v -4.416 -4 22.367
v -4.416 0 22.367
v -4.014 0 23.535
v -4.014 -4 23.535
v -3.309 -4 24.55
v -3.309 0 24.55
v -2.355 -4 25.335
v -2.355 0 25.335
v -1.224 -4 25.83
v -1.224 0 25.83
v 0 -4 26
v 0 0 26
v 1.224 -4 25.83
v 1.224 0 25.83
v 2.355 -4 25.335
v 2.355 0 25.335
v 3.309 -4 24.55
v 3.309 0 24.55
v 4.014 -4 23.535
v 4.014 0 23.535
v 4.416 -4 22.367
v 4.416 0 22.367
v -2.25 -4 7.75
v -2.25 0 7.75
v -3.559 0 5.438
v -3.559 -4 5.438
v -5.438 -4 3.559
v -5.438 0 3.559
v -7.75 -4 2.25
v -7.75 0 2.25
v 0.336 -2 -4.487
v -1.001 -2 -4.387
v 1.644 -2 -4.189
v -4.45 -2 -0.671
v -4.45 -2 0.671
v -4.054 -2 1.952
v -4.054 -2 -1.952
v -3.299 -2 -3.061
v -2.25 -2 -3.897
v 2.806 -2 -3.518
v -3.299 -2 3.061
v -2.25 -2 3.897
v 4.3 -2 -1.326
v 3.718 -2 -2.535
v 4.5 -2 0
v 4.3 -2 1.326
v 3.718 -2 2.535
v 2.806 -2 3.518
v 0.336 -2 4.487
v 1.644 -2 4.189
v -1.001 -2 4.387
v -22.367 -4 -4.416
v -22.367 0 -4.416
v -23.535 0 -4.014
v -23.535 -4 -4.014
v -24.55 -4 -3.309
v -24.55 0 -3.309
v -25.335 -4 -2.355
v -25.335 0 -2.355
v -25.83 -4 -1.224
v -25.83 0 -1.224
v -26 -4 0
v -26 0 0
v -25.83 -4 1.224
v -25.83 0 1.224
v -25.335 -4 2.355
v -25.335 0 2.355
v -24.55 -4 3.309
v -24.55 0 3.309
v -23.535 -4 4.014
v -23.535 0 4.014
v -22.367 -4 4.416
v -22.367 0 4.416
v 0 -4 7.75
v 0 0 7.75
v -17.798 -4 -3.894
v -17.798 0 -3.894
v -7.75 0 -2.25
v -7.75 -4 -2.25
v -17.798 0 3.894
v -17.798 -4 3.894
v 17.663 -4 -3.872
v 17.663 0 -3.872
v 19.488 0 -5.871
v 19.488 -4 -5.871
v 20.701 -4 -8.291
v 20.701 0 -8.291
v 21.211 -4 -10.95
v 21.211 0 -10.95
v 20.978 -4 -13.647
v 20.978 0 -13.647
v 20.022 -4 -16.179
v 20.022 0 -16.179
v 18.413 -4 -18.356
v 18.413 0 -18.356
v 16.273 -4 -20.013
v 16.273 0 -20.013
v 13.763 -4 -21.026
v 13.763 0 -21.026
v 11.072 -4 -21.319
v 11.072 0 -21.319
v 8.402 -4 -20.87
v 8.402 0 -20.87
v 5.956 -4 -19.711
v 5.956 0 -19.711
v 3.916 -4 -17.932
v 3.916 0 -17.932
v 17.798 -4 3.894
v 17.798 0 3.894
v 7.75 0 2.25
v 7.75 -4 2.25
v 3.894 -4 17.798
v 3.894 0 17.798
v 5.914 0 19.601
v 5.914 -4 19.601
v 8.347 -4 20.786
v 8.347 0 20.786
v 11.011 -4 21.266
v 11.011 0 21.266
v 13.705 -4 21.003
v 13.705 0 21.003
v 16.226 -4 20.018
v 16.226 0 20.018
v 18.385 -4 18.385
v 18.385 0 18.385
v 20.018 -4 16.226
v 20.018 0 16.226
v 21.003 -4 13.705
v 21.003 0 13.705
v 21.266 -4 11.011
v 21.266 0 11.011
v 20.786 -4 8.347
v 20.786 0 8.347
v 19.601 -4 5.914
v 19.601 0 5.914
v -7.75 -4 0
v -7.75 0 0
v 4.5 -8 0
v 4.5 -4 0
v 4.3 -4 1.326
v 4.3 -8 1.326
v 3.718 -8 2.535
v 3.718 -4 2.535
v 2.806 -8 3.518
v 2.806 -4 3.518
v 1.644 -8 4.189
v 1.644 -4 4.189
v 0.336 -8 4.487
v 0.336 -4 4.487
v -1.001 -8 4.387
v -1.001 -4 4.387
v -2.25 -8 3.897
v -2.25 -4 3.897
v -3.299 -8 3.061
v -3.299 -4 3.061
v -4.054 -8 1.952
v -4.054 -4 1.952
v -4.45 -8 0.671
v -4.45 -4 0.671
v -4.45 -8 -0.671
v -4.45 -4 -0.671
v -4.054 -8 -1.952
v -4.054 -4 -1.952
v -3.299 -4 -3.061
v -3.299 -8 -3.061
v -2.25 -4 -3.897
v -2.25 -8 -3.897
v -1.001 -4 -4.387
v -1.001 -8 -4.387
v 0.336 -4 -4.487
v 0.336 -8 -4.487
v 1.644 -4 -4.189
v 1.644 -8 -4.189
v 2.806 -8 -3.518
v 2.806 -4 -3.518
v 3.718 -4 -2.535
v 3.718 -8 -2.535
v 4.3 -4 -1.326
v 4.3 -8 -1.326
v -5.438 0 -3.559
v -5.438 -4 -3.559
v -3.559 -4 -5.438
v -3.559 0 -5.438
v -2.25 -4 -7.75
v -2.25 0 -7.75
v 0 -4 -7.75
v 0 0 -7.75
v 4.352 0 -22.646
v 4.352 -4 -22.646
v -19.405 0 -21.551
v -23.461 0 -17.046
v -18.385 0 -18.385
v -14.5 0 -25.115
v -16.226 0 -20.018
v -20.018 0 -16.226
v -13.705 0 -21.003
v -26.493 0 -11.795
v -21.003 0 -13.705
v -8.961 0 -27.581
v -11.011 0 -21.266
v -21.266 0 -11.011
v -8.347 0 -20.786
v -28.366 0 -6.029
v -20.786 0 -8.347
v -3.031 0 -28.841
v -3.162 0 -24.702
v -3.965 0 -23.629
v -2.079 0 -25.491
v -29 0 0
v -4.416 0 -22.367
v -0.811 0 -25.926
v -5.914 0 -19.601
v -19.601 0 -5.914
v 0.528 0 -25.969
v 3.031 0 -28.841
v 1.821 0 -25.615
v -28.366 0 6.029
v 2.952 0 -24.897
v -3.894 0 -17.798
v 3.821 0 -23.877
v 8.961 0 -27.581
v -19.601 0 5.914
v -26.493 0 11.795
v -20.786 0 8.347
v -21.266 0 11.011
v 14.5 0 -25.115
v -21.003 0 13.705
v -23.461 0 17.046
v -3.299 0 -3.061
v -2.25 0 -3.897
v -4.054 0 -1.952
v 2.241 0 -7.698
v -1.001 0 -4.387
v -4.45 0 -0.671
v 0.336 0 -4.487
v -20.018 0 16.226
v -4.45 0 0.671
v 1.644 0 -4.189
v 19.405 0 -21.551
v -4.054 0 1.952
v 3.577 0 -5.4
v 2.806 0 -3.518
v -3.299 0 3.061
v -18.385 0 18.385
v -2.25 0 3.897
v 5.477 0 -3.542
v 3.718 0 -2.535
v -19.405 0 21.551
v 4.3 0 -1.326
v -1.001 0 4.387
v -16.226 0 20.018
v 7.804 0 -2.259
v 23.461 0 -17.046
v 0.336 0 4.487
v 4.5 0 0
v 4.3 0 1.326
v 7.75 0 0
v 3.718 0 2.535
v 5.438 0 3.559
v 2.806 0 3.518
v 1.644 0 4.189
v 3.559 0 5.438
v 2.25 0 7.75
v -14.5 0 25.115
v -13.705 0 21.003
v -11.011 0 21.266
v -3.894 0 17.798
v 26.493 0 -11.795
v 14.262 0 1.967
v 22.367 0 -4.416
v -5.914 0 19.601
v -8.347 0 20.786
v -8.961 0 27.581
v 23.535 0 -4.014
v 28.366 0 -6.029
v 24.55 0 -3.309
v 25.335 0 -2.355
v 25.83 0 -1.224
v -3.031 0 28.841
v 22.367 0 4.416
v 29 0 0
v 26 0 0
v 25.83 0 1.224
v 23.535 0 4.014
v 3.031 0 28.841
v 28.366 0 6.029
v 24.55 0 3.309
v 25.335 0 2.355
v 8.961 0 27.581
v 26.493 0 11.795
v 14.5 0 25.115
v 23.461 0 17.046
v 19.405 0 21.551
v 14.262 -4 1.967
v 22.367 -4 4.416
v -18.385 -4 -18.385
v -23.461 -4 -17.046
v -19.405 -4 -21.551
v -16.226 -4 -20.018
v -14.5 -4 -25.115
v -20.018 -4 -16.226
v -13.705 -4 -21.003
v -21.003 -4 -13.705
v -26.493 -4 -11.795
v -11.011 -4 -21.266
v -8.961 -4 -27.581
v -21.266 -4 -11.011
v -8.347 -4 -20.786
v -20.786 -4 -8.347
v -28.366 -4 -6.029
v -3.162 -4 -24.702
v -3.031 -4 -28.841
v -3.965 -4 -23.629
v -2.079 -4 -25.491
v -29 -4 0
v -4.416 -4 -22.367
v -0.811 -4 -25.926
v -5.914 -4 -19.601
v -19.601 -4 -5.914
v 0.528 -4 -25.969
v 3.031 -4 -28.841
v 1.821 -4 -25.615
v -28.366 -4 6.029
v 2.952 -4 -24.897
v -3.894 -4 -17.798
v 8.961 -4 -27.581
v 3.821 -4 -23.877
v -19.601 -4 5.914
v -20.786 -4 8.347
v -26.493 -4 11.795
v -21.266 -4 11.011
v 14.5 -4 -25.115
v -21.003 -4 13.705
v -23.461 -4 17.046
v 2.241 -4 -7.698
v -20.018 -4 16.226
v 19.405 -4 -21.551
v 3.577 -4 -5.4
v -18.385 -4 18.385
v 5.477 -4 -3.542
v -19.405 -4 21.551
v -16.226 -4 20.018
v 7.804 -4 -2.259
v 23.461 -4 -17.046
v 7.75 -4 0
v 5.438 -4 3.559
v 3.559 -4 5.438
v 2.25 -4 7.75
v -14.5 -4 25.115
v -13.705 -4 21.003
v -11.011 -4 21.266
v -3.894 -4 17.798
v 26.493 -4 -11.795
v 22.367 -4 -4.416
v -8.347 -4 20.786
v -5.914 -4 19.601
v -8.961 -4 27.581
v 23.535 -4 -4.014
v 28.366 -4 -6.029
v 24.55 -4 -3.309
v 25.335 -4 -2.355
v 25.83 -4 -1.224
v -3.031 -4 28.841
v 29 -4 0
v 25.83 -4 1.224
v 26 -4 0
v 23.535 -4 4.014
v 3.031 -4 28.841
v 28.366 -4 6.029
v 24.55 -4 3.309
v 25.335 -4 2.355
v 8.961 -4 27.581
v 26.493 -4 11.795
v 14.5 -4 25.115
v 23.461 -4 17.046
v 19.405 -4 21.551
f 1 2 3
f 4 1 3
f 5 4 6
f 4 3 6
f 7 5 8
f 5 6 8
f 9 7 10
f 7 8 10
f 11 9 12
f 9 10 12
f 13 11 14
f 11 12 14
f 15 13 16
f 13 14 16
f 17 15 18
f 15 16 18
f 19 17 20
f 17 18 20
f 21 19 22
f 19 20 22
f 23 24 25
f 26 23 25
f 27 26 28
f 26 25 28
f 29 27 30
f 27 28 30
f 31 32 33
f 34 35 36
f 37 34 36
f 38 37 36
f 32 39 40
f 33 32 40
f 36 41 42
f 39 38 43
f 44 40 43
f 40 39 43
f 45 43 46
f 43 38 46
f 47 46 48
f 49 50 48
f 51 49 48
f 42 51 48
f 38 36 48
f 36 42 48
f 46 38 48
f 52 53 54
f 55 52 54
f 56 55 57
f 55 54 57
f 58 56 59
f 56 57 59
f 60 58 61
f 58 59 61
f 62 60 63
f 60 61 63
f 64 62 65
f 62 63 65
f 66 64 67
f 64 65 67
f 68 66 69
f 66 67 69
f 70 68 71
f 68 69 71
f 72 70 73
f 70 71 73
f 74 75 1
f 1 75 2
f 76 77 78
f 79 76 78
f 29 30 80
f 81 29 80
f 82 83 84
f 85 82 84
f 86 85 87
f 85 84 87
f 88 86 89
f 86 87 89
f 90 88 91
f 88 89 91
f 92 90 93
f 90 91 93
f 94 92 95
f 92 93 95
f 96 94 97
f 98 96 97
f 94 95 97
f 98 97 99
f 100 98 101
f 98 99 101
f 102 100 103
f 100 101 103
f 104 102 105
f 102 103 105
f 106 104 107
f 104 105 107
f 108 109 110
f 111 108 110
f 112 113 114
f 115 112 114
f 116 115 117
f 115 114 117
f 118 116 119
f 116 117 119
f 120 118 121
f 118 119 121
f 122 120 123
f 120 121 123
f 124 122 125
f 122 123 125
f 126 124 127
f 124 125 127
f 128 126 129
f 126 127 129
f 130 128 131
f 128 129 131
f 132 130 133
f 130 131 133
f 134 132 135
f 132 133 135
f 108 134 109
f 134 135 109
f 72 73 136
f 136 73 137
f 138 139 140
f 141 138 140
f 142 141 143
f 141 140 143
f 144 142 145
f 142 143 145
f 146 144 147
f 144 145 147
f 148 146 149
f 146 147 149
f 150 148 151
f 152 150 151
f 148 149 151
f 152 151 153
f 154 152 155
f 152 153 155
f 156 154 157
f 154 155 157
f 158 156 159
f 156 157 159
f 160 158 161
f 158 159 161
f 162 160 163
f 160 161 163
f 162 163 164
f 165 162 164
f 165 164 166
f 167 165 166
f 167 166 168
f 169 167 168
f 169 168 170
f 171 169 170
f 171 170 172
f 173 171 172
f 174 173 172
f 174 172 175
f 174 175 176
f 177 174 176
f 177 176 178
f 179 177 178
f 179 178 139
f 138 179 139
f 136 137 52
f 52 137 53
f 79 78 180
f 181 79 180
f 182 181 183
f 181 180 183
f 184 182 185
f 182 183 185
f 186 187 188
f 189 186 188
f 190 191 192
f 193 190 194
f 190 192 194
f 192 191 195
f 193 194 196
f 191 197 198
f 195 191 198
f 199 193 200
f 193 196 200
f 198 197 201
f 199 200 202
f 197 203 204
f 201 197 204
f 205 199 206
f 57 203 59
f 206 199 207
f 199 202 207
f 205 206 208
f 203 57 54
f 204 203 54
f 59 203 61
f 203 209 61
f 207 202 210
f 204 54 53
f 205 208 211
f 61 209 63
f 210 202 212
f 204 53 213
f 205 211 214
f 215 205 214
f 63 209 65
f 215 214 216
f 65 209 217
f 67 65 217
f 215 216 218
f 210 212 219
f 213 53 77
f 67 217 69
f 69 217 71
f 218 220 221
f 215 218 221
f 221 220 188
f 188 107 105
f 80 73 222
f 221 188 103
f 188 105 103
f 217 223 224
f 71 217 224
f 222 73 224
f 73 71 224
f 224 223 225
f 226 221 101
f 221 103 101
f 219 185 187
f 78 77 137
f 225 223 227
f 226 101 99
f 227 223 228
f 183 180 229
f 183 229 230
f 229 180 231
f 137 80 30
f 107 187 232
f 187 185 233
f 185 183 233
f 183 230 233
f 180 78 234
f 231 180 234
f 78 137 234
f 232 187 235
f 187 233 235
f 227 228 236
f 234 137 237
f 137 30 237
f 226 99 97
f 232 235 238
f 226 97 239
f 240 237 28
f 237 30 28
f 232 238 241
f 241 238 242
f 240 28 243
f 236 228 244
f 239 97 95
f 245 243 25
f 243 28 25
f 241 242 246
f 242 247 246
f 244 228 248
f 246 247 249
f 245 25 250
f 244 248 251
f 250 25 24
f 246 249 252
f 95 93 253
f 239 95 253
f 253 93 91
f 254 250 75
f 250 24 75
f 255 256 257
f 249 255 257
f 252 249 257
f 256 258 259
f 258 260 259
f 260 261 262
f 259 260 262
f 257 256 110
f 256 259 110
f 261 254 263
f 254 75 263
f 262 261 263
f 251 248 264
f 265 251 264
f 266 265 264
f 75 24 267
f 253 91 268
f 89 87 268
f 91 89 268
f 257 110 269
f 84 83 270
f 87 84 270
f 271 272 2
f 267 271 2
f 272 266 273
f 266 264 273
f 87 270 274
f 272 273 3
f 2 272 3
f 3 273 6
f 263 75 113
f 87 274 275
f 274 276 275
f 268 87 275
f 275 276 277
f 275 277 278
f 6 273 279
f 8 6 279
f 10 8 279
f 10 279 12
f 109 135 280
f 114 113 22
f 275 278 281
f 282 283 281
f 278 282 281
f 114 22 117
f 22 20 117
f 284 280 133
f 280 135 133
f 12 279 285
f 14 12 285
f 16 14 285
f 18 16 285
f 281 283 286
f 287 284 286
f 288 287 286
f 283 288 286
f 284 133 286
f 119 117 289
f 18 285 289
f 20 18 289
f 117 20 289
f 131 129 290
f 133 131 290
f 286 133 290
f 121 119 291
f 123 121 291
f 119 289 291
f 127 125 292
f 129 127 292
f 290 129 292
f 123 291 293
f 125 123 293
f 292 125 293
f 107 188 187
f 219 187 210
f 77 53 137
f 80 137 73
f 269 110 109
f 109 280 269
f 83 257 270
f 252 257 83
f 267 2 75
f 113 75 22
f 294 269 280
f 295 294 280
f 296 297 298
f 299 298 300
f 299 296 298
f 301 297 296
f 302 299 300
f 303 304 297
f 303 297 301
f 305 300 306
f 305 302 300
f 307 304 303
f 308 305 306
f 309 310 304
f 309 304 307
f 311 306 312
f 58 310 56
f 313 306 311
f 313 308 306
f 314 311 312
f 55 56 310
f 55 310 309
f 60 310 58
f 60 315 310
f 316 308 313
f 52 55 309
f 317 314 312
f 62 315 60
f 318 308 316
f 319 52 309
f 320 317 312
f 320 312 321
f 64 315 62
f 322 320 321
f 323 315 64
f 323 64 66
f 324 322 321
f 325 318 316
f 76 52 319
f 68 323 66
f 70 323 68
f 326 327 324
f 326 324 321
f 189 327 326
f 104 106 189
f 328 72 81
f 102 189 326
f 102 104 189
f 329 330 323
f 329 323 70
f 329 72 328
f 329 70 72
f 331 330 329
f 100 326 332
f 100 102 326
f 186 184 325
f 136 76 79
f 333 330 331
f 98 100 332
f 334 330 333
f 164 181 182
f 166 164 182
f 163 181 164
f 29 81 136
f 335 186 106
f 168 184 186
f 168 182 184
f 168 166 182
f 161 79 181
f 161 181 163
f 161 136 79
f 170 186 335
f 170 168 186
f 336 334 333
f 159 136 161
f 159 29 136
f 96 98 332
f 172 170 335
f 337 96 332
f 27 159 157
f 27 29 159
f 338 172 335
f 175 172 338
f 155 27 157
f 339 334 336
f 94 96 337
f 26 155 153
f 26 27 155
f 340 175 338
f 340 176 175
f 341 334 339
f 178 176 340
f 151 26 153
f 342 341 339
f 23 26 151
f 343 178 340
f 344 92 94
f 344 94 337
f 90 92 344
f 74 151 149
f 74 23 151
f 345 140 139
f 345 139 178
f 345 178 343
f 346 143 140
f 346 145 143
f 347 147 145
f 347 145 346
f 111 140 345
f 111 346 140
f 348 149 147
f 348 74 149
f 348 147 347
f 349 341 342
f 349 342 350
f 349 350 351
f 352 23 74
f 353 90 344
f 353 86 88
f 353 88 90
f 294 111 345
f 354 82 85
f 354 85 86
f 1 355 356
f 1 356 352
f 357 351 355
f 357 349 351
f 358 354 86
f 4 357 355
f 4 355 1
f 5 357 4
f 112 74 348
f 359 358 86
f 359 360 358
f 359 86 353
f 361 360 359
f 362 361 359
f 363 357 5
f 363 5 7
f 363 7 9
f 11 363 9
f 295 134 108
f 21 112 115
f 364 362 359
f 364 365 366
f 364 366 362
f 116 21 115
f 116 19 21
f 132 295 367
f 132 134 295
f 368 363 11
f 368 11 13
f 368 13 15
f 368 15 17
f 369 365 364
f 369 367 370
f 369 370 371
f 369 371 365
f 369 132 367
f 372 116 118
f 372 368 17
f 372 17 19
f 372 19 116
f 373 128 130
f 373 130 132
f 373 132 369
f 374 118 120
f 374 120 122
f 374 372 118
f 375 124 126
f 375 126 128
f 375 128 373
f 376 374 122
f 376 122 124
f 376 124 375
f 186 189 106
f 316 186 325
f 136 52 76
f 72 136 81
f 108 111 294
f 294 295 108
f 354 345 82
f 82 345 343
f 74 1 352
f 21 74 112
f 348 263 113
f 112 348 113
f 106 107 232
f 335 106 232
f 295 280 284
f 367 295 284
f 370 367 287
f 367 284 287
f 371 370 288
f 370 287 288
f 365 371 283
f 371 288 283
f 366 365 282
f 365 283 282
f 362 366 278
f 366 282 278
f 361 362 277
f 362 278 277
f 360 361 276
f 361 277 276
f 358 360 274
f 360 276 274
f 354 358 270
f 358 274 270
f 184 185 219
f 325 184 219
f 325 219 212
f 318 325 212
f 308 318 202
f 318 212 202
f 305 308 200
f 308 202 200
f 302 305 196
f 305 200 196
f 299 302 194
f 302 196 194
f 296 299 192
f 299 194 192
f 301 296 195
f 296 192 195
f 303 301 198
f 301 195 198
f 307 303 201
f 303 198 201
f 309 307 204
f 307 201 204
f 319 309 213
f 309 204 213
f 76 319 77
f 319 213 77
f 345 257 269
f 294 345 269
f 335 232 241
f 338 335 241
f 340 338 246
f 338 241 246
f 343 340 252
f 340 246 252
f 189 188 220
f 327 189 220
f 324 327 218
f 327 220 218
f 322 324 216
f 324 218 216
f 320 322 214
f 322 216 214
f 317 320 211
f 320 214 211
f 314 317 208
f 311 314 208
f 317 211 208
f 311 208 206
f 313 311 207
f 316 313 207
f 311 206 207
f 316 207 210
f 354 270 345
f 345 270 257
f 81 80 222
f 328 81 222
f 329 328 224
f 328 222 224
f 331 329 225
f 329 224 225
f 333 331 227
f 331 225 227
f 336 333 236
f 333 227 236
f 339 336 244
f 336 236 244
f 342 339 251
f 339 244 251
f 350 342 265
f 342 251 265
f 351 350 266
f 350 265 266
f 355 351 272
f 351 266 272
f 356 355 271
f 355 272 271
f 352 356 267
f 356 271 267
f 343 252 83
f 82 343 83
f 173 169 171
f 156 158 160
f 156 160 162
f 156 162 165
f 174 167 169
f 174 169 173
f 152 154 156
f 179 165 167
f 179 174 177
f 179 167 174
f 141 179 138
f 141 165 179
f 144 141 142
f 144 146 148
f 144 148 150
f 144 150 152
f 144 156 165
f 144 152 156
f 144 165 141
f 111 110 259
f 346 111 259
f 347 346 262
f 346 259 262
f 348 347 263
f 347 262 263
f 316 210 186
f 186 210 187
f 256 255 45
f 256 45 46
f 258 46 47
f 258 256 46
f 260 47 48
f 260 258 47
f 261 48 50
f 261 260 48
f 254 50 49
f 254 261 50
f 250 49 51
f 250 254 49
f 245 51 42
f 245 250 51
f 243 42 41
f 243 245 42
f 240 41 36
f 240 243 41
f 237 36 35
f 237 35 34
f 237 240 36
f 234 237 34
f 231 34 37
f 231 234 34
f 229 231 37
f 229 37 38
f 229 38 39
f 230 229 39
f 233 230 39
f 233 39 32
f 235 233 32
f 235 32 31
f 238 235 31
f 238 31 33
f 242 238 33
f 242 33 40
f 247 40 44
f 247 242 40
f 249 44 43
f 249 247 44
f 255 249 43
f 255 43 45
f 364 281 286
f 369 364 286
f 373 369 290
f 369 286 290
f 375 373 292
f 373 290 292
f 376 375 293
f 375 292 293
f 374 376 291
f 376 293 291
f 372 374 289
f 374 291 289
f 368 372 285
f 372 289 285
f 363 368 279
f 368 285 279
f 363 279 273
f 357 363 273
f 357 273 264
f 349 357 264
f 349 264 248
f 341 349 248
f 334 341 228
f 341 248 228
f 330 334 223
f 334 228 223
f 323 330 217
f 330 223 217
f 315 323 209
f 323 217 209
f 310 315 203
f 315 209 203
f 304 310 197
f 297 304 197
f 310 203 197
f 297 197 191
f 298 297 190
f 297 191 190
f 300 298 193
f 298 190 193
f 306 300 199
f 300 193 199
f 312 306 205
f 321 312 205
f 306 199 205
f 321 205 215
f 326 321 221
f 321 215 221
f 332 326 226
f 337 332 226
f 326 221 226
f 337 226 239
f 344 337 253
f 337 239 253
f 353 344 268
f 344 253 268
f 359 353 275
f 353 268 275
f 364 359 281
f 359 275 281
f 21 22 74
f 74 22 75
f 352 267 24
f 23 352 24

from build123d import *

# Parameters (mm, degrees)
F0_R     = 4.5
F1_DEPTH = 8
F0_R_2   = 29
F0_R_3   = 27
F2_DEPTH = 4
F3_DEPTH = 2


with BuildPart() as f1:
    # F0 (on Front) → F1 (new body)
    with BuildSketch(Plane.XZ):
        Circle(F0_R)
    extrude(amount=F1_DEPTH)

    # F0 (on Front) → F2 (join)
    with BuildSketch(Plane.XZ):
        Circle(F0_R_2)
        Circle(F0_R_3, mode=Mode.SUBTRACT)
        Circle(F0_R_3)
        with BuildLine():
            ThreePointArc((4.3516162867, -22.646052221), (-0.1431680004, -25.9977219705), (-4.4156935051, -22.3669780097))
            Line((-4.4156935051, -22.3669780097), (0, -7.75))
            Line((0, -7.75), (4.3516162867, -22.646052221))
        make_face(mode=Mode.SUBTRACT)
        with BuildLine():
            ThreePointArc((-3.8942970998, -17.7984822768), (-18.3847763109, -18.3847763109), (-17.7984822768, -3.8942970998))
            Line((-17.7984822768, -3.8942970998), (-7.75, -2.25))
            ThreePointArc((-7.75, -2.25), (-4.4349924254, -4.4349924254), (-2.25, -7.75))
            Line((-2.25, -7.75), (-3.8942970998, -17.7984822768))
        make_face(mode=Mode.SUBTRACT)
        with BuildLine():
            Line((3.9160785154, -17.9315909272), (2.241457342, -7.6977948676))
            ThreePointArc((2.241457342, -7.6977948676), (4.4638924206, -4.4067558), (7.8040467228, -2.2588440092))
            Line((7.8040467228, -2.2588440092), (17.6630391225, -3.8721336746))
            ThreePointArc((17.6630391225, -3.8721336746), (18.4127954662, -18.3556588455), (3.9160785154, -17.9315909272))
        make_face(mode=Mode.SUBTRACT)
        with BuildLine():
            ThreePointArc((-22.3669780097, -4.4156935051), (-26, 0), (-22.3669780097, 4.4156935051))
            Line((-22.3669780097, 4.4156935051), (-7.75, 0))
            Line((-7.75, 0), (-22.3669780097, -4.4156935051))
        make_face(mode=Mode.SUBTRACT)
        with BuildLine():
            Line((-7.75, 2.25), (-17.7984822768, 3.8942970998))
            ThreePointArc((-17.7984822768, 3.8942970998), (-18.3847763109, 18.3847763109), (-3.8942970998, 17.7984822768))
            Line((-3.8942970998, 17.7984822768), (-2.25, 7.75))
            ThreePointArc((-2.25, 7.75), (-4.4349924254, 4.4349924254), (-7.75, 2.25))
        make_face(mode=Mode.SUBTRACT)
        Circle(F0_R, mode=Mode.SUBTRACT)
        with BuildLine():
            Line((17.7984822768, 3.8942970998), (7.75, 2.25))
            ThreePointArc((7.75, 2.25), (4.4349924254, 4.4349924254), (2.25, 7.75))
            Line((2.25, 7.75), (3.8942970998, 17.7984822768))
            ThreePointArc((3.8942970998, 17.7984822768), (18.3847763109, 18.3847763109), (17.7984822768, 3.8942970998))
        make_face(mode=Mode.SUBTRACT)
        with BuildLine():
            ThreePointArc((22.3669780097, 4.4156935051), (26, 0), (22.3669780097, -4.4156935051))
            Line((22.3669780097, -4.4156935051), (7.75, 0))
            Line((7.75, 0), (14.262410288, 1.9673565762))
            Line((14.262410288, 1.9673565762), (22.3669780097, 4.4156935051))
        make_face(mode=Mode.SUBTRACT)
        with BuildLine():
            ThreePointArc((-4.4156935051, 22.3669780097), (0, 26), (4.4156935051, 22.3669780097))
            Line((4.4156935051, 22.3669780097), (0, 7.75))
            Line((0, 7.75), (-4.4156935051, 22.3669780097))
        make_face(mode=Mode.SUBTRACT)
    extrude(amount=F2_DEPTH)

    # F0 (on Front) → F3 (cut)
    with BuildSketch(Plane.XZ):
        Circle(F0_R)
    extrude(amount=F3_DEPTH, mode=Mode.SUBTRACT)


solid = f1.part
